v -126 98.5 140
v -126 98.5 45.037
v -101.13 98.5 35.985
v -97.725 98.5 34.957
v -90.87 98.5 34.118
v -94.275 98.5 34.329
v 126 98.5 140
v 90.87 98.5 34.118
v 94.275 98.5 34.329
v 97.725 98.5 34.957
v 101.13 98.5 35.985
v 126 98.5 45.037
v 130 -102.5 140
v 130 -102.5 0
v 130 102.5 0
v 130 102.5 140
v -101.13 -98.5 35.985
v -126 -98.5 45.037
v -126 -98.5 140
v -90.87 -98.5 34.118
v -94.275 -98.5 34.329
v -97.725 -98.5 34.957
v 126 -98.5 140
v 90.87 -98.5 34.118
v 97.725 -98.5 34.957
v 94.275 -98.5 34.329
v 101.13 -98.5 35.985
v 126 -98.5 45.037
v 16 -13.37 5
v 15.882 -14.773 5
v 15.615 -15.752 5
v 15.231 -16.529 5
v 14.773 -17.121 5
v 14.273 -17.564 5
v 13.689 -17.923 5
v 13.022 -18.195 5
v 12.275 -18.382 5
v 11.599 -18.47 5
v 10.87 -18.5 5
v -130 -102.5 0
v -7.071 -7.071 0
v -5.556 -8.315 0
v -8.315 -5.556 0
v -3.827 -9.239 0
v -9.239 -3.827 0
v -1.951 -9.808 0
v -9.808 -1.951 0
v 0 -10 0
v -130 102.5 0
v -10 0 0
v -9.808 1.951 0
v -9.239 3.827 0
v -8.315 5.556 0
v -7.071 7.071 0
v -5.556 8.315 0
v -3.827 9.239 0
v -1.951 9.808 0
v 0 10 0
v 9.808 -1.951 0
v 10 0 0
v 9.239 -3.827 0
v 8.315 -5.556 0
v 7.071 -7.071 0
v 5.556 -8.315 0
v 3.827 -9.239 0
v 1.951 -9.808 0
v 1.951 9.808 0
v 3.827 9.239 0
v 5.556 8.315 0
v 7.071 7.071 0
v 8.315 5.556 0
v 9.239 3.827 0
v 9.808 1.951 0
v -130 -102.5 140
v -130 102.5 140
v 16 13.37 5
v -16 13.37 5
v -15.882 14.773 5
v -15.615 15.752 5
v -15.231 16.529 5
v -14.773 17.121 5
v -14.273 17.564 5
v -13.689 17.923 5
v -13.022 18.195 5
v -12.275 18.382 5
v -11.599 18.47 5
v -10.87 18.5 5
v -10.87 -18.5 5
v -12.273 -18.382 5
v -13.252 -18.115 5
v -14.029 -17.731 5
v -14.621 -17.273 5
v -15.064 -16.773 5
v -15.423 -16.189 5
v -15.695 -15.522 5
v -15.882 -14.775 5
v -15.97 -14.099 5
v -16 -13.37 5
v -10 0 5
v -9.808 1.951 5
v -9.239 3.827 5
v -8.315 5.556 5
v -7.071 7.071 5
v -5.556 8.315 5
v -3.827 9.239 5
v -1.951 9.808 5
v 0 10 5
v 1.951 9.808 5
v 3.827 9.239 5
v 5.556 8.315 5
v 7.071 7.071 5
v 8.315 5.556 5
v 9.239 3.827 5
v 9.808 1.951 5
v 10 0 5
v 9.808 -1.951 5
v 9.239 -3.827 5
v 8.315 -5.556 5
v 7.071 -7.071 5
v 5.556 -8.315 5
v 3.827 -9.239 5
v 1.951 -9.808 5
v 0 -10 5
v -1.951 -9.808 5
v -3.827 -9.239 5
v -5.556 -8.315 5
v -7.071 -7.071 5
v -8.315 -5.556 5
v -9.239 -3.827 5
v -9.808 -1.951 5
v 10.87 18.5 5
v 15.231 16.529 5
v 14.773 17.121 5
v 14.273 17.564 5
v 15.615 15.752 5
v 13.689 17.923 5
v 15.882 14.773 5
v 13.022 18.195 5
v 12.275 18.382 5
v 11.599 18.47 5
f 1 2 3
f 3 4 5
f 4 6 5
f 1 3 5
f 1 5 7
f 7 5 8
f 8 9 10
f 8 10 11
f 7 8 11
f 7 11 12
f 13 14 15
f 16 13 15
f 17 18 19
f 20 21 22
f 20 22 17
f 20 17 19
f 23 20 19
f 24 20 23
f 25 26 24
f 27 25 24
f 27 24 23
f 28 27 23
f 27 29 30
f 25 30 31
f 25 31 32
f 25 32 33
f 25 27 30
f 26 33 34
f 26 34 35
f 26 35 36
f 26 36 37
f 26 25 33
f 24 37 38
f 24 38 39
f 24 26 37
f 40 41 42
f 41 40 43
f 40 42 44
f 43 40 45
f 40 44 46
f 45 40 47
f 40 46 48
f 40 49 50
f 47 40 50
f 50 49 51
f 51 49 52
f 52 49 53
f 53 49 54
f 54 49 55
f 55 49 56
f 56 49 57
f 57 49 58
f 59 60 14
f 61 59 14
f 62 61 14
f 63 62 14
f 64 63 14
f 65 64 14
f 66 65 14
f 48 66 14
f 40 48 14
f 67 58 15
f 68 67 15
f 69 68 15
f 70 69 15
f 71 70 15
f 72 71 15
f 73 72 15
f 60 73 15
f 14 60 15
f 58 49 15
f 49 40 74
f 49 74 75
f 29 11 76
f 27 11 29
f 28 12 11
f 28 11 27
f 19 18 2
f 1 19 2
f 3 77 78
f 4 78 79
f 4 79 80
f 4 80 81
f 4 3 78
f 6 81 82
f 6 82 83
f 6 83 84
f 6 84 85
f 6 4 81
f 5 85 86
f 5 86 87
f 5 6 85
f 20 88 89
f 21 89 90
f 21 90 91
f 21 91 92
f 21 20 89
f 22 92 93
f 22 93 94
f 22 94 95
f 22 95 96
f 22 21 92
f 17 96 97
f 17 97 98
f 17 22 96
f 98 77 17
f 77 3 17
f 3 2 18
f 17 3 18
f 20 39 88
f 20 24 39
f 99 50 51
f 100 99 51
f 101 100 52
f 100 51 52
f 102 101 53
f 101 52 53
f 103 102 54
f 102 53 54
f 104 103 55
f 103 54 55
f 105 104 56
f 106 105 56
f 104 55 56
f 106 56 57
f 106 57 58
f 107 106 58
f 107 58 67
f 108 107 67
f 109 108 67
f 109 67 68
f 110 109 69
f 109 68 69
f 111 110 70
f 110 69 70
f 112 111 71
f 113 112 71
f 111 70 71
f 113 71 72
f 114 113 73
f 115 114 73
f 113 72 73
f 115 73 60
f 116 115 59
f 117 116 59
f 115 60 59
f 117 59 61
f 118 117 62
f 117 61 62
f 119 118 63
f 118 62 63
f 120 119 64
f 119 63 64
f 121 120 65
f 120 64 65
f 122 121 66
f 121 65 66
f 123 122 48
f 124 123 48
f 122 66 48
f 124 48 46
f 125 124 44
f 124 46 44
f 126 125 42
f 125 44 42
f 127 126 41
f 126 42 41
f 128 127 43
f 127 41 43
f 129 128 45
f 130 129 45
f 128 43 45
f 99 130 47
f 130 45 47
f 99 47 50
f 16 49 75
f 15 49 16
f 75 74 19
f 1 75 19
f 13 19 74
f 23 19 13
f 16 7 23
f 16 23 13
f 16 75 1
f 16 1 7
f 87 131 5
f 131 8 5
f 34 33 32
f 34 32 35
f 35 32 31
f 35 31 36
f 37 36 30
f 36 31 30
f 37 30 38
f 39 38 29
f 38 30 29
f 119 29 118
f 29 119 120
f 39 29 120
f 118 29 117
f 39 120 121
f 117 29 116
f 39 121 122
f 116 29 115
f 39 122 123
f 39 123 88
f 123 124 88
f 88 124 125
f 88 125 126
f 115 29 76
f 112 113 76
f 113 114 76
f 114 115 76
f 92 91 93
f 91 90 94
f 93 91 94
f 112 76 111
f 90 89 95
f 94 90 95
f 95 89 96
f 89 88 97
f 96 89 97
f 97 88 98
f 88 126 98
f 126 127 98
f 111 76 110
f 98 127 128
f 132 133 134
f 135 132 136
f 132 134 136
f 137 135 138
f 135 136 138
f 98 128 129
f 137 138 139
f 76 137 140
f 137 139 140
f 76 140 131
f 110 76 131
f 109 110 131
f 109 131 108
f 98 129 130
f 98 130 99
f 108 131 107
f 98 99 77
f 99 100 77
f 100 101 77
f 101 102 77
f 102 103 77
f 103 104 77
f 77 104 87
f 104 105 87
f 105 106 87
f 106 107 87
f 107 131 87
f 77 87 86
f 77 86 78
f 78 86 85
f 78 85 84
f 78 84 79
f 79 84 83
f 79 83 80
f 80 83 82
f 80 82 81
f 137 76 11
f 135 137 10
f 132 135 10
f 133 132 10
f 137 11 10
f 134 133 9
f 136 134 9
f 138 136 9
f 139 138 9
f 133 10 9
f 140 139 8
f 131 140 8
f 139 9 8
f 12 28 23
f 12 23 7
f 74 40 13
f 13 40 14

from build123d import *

# Parameters (mm, degrees)
SKETCH_1_W          = 260
SKETCH_1_H          = 205
SKETCH_1_W_2        = 252
SKETCH_1_H_2        = 197
EXTRUDE_1_DEPTH     = 140
SKETCH_2_W          = 260
SKETCH_2_H          = 205
EXTRUDE_1_2_DEPTH   = 5
SKETCH_3_R          = 10
CUT_EXTRUDE_1_DEPTH = 5
CHAMFER_1_SIZE      = 80
CHAMFER_1_SIZE2     = 29.117618741
CHAMFER_2_SIZE      = 110
CHAMFER_2_SIZE2     = 40.036725769
FILLET_1_R          = 15


with BuildPart() as part:
    # 草图1 → Extrude 1 (new body)
    with BuildSketch(Plane.XY):
        Rectangle(SKETCH_1_W, SKETCH_1_H)
        Rectangle(SKETCH_1_W_2, SKETCH_1_H_2, mode=Mode.SUBTRACT)
    extrude(amount=EXTRUDE_1_DEPTH)

    # 草图2 → Extrude 1 2 (add)
    with BuildSketch(Plane(origin=(0, 0, 0), x_dir=(-1, 0, 0), z_dir=(0, 0, -1))):
        Rectangle(SKETCH_2_W, SKETCH_2_H)
    extrude(amount=-EXTRUDE_1_2_DEPTH)

    # 草图3 → 切除-拉伸1 (cut)
    with BuildSketch(Plane(origin=(0, 0, 0), x_dir=(-1, 0, 0), z_dir=(0, 0, -1))):
        Circle(SKETCH_3_R)
    extrude(amount=-CUT_EXTRUDE_1_DEPTH, mode=Mode.SUBTRACT)

    # 倒角1
    chamfer_1_edges = [part.edges().sort_by_distance(p)[0] for p in [
        (0, -98.5, 5),
        (0, 98.5, 5),
    ]]
    chamfer_1_side = [part.faces().sort_by_distance(p)[0] for p in [
        (122.801359664, 0, 5),
    ]]
    chamfer(chamfer_1_edges, length=CHAMFER_1_SIZE, length2=CHAMFER_1_SIZE2, reference=chamfer_1_side[0])

    # 倒角2
    chamfer_2_edges = [part.edges().sort_by_distance(p)[0] for p in [
        (-126, 0, 5),
        (126, 0, 5),
    ]]
    chamfer_2_side = [part.faces().sort_by_distance(p)[0] for p in [
        (123.452982136, 0, 5),
    ]]
    chamfer(chamfer_2_edges, length=CHAMFER_2_SIZE, length2=CHAMFER_2_SIZE2, reference=chamfer_2_side[0])

    # 圆角1
    fillet_1_edges = [part.edges().sort_by_distance(p)[0] for p in [
        (56, 58.5, 19.558809371),
        (-56, 58.5, 19.558809371),
        (56, -58.5, 19.558809371),
        (-56, -58.5, 19.558809371),
    ]]
    fillet(fillet_1_edges, radius=FILLET_1_R)


solid = part.part
